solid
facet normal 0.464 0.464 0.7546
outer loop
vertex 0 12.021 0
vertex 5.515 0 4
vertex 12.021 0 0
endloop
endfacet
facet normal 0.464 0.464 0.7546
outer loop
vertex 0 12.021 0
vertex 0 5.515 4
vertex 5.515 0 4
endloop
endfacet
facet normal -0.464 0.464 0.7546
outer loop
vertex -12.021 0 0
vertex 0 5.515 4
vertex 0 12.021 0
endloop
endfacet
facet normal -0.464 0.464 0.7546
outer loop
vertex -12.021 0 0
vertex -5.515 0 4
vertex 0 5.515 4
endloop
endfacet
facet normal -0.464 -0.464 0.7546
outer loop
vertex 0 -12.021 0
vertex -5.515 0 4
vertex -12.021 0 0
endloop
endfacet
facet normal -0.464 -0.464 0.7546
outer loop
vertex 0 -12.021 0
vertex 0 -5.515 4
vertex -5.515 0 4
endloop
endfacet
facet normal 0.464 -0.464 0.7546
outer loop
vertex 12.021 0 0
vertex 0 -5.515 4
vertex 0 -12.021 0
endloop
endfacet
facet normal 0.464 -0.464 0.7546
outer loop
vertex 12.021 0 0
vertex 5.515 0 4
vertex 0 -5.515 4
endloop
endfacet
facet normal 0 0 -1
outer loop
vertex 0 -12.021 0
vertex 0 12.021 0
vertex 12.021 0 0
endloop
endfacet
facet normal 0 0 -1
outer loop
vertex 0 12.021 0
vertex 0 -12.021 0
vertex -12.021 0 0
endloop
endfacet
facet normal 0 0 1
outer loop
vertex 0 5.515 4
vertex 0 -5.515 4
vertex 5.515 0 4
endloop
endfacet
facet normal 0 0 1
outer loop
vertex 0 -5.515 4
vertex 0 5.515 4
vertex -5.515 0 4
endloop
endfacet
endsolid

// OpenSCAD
//x^2 + x^2 = 15
//2x^2 = 15

s1 = 17;


rounding = 3;
cube_size = 12 - 2 * rounding;
half_size = cube_size * 0.5;

s2 = 12 - (rounding * 1.4);

height = 4;

//translate([0, 0, height]) translate([0, 0, rounding]) #minkowski() {
//    rotate([0, 0, 45]) translate([-half_size, -half_size, 0]) cube(cube_size);
//    sphere(rounding, $fn=100);
//}
//larger_cube_size = 14;
//larger_half_size = larger_cube_size * 0.5;
//translate([0, 0, 5]) rotate([0, 0, 45]) translate([-larger_half_size, -larger_half_size, 0]) cube(larger_cube_size);

cylinder(h=height, r1=sqrt(s1 * s1 + s1 * s1) / 2,  r2=sqrt(2 * s2 * s2) / 2, $fn=4);
